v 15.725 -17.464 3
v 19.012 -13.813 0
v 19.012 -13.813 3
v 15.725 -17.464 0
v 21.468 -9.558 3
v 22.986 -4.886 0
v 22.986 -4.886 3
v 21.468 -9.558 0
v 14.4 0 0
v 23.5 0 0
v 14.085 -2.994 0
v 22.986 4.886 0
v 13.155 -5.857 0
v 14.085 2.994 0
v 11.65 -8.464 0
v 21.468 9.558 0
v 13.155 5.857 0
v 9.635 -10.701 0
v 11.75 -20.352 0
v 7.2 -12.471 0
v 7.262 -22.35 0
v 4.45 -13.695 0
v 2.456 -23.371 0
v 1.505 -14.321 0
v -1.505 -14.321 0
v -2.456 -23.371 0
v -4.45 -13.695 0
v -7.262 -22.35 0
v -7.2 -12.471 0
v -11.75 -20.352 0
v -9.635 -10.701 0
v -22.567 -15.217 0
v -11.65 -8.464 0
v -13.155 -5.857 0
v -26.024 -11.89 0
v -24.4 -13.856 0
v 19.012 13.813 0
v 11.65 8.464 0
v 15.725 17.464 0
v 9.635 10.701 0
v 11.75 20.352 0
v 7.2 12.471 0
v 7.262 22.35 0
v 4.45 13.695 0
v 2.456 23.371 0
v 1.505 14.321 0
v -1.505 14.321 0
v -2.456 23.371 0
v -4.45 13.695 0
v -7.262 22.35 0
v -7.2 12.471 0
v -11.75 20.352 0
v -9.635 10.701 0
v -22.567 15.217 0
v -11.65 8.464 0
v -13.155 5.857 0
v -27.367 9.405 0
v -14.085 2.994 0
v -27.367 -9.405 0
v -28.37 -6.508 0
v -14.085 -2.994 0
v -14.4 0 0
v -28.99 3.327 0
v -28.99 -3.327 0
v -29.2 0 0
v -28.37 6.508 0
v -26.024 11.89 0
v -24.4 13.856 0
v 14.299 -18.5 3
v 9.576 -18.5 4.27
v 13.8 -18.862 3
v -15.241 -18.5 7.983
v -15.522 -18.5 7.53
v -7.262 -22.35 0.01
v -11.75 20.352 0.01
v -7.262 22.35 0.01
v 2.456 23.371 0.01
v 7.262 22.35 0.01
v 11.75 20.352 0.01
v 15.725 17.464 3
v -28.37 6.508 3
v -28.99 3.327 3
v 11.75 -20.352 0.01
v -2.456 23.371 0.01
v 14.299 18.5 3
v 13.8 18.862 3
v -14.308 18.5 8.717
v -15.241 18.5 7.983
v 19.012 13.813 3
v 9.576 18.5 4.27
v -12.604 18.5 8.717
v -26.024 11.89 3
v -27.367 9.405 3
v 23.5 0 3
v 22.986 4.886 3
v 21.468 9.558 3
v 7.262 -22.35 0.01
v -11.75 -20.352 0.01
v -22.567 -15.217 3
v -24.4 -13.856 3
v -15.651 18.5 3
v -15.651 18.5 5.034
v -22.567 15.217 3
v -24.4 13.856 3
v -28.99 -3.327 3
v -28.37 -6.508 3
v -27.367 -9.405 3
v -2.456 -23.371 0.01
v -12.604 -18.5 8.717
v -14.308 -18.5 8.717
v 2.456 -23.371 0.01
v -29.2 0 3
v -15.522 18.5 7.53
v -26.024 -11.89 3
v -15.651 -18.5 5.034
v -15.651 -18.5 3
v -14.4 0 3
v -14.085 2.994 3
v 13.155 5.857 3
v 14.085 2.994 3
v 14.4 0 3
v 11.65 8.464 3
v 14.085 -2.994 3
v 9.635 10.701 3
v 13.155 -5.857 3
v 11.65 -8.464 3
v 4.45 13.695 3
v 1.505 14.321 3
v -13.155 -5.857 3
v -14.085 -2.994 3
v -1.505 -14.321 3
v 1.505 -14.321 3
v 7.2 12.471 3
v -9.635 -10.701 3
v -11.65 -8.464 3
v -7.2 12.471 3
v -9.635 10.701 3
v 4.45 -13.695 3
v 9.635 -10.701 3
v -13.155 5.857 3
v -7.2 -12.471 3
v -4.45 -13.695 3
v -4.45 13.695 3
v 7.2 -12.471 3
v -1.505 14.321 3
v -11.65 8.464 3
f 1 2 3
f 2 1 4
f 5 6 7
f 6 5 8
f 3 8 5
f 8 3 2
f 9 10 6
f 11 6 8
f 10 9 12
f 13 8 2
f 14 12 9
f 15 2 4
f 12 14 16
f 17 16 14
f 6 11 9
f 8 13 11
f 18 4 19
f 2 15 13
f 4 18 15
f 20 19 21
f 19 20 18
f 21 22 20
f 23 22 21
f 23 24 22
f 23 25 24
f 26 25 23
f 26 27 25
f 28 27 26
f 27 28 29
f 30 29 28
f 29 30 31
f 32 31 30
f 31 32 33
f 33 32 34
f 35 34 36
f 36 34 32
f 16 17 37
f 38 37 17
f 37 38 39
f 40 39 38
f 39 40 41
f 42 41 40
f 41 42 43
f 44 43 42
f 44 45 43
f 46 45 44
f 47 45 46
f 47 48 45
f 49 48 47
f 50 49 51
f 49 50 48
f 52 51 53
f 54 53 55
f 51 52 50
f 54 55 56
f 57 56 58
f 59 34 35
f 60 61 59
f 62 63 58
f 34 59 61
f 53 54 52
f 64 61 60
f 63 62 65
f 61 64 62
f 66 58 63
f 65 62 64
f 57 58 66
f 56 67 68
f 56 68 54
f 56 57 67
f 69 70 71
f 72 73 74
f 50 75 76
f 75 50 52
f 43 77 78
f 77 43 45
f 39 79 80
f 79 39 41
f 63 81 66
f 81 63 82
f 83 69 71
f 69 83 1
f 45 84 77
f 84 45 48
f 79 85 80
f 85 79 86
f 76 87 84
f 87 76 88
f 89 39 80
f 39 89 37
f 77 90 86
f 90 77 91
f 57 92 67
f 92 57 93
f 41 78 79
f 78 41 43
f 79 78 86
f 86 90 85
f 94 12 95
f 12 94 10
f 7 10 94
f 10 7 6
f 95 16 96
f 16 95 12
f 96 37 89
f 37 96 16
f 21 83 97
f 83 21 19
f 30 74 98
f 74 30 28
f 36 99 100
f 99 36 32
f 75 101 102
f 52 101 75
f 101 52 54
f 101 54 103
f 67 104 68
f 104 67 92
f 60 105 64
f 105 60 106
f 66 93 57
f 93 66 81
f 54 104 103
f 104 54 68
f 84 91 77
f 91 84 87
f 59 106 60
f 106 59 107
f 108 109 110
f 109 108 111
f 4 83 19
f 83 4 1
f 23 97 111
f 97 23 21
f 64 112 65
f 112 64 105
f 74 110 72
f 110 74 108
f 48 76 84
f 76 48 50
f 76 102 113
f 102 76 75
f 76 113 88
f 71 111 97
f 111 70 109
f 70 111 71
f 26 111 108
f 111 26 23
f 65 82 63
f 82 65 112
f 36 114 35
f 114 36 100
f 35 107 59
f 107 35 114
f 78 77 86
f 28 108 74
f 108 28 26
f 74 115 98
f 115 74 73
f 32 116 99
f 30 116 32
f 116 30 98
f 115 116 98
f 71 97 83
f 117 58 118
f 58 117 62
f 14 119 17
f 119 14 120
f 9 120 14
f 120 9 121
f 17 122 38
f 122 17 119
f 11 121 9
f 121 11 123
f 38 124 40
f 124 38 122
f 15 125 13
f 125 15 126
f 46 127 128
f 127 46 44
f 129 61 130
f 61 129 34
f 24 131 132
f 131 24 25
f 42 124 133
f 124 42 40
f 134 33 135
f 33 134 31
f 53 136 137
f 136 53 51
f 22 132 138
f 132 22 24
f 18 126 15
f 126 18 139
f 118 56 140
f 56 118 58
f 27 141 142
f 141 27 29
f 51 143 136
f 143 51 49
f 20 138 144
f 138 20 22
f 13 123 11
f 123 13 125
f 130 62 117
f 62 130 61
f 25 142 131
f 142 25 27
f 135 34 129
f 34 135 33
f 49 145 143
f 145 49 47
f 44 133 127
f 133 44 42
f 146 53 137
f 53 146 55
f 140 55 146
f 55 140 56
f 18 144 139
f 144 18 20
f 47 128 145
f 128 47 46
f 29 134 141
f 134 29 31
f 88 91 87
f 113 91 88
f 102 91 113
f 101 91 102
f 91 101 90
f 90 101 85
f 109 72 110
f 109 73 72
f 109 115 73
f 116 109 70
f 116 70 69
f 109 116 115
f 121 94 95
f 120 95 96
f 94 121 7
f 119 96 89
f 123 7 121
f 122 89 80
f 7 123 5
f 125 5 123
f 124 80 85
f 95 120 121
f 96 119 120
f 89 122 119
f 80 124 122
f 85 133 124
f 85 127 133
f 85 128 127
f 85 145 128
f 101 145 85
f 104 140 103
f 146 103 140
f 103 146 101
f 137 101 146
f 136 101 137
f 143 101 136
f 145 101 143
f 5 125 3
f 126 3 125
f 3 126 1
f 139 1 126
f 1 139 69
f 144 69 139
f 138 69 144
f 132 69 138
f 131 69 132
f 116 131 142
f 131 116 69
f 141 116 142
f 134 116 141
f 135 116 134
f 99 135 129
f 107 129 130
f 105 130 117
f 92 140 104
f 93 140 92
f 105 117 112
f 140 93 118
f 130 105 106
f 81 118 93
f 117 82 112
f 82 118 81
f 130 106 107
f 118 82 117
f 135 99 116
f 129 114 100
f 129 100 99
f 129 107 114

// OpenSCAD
//$fn=150;

module fork(height) { translate([0, 0, -0.01]) cylinder(h=height + 0.01, d=28.8); }
module stem(height)
translate([0,0,3]) hull()
{
	translate([-19.601,0,0]) scale([0.6,1,1]) cylinder(h=height, d=32);
	translate([-20,-37/2,0]) cube([50,37,height]);

}
module neck(height) {
	hull()
	{
		translate([18.5,0,0]) scale([1,1.3,1]) cylinder(h=height, d=10);
		cylinder(h=height, d=35);
		translate([-19.6,0,0]) scale([0.6,1,1]) cylinder(h=height, d=32);
	}
}

union()
{	difference()
	{	hull()
		{	cylinder(h=0.01, d=47);
			difference()
			{	cylinder(h=3, d=47);
				translate([-11.2,0,25]) cube(50, center=true);
			}
			difference()
			{	neck(18.5);
				translate([0,0,10+7.5]) rotate([0,17,0]) translate([-6,0,0]) cube([48,48,20], center=true);
				translate([38.8,0,25]) cube(50, center=true);
			}
		}
		fork(100);
		stem(15);
	}
	
}

//rotate([0,-17,0]) color("black") fork();
//rotate([0,-17,0]) color("darkgrey") stem();
